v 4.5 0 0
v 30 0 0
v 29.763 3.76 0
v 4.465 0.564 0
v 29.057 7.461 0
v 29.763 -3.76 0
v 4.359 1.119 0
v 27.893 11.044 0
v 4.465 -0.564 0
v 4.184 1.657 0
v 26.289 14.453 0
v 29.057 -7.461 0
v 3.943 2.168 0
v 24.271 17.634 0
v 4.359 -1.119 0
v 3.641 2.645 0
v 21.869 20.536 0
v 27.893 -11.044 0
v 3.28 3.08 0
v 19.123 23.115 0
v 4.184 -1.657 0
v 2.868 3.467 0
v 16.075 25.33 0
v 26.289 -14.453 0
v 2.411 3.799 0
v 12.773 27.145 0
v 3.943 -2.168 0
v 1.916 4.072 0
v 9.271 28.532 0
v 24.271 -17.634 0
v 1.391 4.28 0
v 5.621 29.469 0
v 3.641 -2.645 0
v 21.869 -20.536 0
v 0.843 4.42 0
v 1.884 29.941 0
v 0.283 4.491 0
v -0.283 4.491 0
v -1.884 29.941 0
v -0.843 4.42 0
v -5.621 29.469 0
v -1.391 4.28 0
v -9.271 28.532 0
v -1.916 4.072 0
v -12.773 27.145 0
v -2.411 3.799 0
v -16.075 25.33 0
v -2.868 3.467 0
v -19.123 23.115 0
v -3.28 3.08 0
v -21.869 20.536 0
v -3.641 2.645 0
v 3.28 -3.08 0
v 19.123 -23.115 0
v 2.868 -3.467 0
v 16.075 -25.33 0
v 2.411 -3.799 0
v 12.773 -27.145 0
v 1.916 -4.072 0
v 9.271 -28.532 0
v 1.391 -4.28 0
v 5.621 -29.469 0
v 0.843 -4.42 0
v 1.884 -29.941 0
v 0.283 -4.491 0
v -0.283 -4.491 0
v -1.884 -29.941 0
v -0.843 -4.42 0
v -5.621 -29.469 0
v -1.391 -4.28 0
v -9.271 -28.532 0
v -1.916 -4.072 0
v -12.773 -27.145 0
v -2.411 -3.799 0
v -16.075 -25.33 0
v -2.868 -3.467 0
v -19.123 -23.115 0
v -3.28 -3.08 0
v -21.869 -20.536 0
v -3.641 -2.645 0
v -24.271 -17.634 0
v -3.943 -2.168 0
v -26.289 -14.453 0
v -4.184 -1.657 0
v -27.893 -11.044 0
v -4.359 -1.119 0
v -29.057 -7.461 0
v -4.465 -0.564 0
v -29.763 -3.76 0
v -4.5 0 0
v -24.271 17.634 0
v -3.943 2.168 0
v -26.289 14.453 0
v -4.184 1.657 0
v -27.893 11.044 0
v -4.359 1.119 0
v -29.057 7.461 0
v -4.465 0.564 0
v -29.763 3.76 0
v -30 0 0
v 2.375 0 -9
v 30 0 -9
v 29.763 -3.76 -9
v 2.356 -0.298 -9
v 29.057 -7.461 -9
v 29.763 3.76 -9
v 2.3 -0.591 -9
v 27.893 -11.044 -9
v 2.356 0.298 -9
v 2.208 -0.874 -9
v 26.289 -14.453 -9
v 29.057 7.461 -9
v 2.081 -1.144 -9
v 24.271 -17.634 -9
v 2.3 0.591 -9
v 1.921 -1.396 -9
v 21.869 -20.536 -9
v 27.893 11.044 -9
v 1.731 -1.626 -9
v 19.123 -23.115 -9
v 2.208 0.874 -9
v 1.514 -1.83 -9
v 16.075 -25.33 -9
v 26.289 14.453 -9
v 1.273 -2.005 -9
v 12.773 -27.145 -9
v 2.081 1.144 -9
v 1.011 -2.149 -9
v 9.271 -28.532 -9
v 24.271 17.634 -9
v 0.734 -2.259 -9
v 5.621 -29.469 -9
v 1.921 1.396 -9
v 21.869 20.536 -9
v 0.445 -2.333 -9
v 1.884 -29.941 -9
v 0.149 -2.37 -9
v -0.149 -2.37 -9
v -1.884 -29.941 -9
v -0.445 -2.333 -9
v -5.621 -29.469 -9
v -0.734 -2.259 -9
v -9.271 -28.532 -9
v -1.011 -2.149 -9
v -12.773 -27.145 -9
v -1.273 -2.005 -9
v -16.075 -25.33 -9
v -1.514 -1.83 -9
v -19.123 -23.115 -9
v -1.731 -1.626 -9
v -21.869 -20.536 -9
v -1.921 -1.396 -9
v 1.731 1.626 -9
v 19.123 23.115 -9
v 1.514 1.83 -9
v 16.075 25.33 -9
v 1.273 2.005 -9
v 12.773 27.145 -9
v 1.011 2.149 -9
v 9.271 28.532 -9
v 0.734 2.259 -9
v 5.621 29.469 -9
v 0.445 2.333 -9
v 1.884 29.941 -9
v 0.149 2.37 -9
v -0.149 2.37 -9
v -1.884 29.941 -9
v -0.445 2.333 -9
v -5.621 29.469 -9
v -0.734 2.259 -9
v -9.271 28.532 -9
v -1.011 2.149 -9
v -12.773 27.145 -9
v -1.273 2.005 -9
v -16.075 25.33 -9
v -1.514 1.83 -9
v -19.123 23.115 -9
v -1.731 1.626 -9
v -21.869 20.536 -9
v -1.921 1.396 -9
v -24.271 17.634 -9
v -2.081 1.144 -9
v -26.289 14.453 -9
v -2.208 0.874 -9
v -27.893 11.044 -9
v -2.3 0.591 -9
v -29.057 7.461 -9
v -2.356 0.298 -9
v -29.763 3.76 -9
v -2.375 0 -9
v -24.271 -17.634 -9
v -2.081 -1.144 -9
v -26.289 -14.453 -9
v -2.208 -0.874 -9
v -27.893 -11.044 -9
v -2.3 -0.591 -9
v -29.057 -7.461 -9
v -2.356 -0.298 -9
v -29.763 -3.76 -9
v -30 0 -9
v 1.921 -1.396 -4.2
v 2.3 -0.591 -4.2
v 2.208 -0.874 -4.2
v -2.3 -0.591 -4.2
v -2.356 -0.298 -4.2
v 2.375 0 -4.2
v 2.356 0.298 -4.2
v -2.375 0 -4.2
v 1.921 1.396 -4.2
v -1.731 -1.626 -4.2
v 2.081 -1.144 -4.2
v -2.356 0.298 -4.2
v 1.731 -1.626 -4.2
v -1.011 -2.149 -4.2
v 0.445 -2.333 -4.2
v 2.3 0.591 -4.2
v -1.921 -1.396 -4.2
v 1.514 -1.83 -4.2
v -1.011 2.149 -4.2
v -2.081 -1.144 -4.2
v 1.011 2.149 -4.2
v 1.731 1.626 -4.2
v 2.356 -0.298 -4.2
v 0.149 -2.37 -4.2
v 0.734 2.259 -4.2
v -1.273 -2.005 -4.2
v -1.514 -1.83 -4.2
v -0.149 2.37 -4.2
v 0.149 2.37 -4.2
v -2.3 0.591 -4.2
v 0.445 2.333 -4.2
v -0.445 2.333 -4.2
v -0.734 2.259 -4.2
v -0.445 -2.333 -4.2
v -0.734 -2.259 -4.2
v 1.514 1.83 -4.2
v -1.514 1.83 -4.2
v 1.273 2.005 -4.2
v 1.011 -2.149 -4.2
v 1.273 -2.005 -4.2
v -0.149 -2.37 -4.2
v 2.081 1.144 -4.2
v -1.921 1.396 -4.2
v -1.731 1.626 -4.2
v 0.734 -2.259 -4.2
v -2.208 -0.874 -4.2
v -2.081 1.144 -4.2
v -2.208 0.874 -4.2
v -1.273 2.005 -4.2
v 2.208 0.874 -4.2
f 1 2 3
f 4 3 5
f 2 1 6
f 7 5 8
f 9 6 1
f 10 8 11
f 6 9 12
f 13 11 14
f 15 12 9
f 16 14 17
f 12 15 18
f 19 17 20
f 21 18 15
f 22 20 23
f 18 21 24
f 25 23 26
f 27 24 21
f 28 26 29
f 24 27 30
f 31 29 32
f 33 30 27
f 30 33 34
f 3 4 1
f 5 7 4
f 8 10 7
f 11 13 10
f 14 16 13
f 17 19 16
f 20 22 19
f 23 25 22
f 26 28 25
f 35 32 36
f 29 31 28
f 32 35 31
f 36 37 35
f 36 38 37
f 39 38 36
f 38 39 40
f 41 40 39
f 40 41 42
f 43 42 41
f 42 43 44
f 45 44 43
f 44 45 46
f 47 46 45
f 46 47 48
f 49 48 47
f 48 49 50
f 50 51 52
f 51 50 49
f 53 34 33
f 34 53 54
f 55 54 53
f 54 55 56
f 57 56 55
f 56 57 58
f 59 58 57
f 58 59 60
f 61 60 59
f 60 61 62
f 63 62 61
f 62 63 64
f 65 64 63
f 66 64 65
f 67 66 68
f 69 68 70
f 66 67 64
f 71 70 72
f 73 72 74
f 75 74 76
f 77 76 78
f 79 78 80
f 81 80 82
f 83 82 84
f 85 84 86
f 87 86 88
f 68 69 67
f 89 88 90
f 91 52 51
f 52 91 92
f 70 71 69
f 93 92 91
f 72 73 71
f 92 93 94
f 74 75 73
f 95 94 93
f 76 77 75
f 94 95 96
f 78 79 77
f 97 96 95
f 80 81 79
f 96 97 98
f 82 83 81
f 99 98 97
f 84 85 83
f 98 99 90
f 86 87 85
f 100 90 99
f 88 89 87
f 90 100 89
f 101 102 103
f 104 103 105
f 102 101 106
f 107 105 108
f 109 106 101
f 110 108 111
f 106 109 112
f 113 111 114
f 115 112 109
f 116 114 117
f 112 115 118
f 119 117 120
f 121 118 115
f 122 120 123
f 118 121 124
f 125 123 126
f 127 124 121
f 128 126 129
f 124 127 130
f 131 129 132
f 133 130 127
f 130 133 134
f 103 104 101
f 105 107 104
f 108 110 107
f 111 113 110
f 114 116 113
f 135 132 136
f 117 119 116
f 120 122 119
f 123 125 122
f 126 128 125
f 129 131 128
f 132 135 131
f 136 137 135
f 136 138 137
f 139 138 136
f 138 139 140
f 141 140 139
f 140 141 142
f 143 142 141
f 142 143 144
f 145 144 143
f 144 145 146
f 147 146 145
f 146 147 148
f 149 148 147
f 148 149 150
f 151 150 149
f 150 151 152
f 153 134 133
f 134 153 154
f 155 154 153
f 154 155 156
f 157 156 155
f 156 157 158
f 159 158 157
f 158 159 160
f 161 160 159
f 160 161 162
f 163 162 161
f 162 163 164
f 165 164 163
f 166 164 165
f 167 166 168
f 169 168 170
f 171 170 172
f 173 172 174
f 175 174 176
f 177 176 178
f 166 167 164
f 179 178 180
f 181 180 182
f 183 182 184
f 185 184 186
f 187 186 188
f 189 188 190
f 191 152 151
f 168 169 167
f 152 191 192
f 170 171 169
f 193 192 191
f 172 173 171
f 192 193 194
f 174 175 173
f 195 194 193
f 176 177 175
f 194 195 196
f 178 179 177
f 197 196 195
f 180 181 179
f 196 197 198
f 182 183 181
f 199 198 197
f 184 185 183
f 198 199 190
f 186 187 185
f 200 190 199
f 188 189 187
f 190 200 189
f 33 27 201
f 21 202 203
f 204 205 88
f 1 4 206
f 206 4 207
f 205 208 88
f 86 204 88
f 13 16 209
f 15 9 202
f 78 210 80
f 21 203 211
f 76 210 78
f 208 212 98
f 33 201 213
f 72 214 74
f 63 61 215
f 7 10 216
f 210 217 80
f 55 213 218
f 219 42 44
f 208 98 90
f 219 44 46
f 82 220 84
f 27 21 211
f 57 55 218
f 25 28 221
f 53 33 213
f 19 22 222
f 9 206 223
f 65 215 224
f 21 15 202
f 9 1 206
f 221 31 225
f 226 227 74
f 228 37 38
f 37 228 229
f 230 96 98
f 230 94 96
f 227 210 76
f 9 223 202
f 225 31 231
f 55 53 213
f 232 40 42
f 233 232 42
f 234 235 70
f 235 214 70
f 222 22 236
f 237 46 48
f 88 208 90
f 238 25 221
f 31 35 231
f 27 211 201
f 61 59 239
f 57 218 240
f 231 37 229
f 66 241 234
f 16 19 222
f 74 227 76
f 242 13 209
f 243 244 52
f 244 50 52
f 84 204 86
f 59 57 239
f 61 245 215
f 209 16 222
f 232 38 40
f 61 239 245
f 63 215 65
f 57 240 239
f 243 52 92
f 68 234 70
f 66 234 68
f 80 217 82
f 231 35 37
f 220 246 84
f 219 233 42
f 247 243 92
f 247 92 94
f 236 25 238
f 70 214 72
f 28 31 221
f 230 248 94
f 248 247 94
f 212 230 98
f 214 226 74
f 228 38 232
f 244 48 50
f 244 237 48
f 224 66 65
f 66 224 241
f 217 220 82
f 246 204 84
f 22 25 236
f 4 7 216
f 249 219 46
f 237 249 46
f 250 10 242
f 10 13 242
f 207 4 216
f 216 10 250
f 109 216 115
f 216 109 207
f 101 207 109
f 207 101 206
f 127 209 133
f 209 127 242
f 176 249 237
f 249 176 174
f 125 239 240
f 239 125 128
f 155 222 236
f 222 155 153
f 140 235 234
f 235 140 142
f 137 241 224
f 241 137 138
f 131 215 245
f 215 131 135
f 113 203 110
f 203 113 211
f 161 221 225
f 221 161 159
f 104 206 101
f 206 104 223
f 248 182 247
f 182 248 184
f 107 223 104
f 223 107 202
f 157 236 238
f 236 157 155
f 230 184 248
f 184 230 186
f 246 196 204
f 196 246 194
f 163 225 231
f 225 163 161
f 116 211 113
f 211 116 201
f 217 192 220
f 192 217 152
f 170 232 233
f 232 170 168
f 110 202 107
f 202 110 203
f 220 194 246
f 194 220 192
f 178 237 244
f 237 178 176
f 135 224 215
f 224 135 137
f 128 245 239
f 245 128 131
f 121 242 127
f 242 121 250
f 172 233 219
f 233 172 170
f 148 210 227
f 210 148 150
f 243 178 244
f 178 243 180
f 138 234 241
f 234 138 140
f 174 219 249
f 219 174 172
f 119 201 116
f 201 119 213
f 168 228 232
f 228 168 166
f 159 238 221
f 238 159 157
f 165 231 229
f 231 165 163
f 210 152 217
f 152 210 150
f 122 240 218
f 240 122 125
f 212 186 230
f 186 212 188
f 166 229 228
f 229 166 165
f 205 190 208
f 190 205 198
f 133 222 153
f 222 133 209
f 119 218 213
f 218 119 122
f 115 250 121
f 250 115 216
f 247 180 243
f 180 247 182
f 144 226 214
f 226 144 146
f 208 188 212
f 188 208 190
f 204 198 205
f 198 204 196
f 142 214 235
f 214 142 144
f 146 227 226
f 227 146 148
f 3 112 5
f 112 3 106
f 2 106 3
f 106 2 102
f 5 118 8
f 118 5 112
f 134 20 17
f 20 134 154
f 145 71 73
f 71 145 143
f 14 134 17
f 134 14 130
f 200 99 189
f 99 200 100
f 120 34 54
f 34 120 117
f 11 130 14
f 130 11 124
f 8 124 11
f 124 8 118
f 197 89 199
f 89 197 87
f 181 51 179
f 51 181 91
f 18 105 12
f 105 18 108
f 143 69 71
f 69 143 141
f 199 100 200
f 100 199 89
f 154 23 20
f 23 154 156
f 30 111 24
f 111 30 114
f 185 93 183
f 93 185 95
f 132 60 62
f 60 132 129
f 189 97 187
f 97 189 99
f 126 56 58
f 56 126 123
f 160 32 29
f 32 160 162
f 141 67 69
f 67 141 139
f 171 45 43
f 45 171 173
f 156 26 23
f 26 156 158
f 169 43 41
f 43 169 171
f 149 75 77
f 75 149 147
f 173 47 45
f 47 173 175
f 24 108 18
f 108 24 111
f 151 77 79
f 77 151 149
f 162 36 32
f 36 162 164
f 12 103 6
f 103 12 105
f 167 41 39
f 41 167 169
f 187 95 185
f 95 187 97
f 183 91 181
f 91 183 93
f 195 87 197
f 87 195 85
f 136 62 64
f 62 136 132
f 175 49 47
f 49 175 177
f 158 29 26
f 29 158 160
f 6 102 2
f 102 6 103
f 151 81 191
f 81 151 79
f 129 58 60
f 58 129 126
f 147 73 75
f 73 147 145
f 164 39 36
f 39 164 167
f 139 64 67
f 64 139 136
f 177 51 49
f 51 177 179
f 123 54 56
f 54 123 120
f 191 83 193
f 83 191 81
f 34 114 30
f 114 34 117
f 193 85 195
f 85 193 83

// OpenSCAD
$fn = 50;


difference() {
	union() {
		translate(v = [0, 0, -9.0000000000]) {
			cylinder(h = 9, r = 30.0000000000);
		}
	}
	union() {
		translate(v = [0, 0, 0]) {
			rotate(a = [0, 0, 0]) {
				difference() {
					union() {
						#translate(v = [0, 0, -9.0000000000]) {
							cylinder(h = 9, r = 2.2500000000);
						}
						#translate(v = [0, 0, -4.2000000000]) {
							cylinder(h = 4.2000000000, r1 = 2.3750000000, r2 = 4.5000000000);
						}
						#translate(v = [0, 0, -9.0000000000]) {
							cylinder(h = 9, r = 2.3750000000);
						}
						#translate(v = [0, 0, -9.0000000000]) {
							cylinder(h = 9, r = 2.2500000000);
						}
					}
					union();
				}
			}
		}
	}
}
